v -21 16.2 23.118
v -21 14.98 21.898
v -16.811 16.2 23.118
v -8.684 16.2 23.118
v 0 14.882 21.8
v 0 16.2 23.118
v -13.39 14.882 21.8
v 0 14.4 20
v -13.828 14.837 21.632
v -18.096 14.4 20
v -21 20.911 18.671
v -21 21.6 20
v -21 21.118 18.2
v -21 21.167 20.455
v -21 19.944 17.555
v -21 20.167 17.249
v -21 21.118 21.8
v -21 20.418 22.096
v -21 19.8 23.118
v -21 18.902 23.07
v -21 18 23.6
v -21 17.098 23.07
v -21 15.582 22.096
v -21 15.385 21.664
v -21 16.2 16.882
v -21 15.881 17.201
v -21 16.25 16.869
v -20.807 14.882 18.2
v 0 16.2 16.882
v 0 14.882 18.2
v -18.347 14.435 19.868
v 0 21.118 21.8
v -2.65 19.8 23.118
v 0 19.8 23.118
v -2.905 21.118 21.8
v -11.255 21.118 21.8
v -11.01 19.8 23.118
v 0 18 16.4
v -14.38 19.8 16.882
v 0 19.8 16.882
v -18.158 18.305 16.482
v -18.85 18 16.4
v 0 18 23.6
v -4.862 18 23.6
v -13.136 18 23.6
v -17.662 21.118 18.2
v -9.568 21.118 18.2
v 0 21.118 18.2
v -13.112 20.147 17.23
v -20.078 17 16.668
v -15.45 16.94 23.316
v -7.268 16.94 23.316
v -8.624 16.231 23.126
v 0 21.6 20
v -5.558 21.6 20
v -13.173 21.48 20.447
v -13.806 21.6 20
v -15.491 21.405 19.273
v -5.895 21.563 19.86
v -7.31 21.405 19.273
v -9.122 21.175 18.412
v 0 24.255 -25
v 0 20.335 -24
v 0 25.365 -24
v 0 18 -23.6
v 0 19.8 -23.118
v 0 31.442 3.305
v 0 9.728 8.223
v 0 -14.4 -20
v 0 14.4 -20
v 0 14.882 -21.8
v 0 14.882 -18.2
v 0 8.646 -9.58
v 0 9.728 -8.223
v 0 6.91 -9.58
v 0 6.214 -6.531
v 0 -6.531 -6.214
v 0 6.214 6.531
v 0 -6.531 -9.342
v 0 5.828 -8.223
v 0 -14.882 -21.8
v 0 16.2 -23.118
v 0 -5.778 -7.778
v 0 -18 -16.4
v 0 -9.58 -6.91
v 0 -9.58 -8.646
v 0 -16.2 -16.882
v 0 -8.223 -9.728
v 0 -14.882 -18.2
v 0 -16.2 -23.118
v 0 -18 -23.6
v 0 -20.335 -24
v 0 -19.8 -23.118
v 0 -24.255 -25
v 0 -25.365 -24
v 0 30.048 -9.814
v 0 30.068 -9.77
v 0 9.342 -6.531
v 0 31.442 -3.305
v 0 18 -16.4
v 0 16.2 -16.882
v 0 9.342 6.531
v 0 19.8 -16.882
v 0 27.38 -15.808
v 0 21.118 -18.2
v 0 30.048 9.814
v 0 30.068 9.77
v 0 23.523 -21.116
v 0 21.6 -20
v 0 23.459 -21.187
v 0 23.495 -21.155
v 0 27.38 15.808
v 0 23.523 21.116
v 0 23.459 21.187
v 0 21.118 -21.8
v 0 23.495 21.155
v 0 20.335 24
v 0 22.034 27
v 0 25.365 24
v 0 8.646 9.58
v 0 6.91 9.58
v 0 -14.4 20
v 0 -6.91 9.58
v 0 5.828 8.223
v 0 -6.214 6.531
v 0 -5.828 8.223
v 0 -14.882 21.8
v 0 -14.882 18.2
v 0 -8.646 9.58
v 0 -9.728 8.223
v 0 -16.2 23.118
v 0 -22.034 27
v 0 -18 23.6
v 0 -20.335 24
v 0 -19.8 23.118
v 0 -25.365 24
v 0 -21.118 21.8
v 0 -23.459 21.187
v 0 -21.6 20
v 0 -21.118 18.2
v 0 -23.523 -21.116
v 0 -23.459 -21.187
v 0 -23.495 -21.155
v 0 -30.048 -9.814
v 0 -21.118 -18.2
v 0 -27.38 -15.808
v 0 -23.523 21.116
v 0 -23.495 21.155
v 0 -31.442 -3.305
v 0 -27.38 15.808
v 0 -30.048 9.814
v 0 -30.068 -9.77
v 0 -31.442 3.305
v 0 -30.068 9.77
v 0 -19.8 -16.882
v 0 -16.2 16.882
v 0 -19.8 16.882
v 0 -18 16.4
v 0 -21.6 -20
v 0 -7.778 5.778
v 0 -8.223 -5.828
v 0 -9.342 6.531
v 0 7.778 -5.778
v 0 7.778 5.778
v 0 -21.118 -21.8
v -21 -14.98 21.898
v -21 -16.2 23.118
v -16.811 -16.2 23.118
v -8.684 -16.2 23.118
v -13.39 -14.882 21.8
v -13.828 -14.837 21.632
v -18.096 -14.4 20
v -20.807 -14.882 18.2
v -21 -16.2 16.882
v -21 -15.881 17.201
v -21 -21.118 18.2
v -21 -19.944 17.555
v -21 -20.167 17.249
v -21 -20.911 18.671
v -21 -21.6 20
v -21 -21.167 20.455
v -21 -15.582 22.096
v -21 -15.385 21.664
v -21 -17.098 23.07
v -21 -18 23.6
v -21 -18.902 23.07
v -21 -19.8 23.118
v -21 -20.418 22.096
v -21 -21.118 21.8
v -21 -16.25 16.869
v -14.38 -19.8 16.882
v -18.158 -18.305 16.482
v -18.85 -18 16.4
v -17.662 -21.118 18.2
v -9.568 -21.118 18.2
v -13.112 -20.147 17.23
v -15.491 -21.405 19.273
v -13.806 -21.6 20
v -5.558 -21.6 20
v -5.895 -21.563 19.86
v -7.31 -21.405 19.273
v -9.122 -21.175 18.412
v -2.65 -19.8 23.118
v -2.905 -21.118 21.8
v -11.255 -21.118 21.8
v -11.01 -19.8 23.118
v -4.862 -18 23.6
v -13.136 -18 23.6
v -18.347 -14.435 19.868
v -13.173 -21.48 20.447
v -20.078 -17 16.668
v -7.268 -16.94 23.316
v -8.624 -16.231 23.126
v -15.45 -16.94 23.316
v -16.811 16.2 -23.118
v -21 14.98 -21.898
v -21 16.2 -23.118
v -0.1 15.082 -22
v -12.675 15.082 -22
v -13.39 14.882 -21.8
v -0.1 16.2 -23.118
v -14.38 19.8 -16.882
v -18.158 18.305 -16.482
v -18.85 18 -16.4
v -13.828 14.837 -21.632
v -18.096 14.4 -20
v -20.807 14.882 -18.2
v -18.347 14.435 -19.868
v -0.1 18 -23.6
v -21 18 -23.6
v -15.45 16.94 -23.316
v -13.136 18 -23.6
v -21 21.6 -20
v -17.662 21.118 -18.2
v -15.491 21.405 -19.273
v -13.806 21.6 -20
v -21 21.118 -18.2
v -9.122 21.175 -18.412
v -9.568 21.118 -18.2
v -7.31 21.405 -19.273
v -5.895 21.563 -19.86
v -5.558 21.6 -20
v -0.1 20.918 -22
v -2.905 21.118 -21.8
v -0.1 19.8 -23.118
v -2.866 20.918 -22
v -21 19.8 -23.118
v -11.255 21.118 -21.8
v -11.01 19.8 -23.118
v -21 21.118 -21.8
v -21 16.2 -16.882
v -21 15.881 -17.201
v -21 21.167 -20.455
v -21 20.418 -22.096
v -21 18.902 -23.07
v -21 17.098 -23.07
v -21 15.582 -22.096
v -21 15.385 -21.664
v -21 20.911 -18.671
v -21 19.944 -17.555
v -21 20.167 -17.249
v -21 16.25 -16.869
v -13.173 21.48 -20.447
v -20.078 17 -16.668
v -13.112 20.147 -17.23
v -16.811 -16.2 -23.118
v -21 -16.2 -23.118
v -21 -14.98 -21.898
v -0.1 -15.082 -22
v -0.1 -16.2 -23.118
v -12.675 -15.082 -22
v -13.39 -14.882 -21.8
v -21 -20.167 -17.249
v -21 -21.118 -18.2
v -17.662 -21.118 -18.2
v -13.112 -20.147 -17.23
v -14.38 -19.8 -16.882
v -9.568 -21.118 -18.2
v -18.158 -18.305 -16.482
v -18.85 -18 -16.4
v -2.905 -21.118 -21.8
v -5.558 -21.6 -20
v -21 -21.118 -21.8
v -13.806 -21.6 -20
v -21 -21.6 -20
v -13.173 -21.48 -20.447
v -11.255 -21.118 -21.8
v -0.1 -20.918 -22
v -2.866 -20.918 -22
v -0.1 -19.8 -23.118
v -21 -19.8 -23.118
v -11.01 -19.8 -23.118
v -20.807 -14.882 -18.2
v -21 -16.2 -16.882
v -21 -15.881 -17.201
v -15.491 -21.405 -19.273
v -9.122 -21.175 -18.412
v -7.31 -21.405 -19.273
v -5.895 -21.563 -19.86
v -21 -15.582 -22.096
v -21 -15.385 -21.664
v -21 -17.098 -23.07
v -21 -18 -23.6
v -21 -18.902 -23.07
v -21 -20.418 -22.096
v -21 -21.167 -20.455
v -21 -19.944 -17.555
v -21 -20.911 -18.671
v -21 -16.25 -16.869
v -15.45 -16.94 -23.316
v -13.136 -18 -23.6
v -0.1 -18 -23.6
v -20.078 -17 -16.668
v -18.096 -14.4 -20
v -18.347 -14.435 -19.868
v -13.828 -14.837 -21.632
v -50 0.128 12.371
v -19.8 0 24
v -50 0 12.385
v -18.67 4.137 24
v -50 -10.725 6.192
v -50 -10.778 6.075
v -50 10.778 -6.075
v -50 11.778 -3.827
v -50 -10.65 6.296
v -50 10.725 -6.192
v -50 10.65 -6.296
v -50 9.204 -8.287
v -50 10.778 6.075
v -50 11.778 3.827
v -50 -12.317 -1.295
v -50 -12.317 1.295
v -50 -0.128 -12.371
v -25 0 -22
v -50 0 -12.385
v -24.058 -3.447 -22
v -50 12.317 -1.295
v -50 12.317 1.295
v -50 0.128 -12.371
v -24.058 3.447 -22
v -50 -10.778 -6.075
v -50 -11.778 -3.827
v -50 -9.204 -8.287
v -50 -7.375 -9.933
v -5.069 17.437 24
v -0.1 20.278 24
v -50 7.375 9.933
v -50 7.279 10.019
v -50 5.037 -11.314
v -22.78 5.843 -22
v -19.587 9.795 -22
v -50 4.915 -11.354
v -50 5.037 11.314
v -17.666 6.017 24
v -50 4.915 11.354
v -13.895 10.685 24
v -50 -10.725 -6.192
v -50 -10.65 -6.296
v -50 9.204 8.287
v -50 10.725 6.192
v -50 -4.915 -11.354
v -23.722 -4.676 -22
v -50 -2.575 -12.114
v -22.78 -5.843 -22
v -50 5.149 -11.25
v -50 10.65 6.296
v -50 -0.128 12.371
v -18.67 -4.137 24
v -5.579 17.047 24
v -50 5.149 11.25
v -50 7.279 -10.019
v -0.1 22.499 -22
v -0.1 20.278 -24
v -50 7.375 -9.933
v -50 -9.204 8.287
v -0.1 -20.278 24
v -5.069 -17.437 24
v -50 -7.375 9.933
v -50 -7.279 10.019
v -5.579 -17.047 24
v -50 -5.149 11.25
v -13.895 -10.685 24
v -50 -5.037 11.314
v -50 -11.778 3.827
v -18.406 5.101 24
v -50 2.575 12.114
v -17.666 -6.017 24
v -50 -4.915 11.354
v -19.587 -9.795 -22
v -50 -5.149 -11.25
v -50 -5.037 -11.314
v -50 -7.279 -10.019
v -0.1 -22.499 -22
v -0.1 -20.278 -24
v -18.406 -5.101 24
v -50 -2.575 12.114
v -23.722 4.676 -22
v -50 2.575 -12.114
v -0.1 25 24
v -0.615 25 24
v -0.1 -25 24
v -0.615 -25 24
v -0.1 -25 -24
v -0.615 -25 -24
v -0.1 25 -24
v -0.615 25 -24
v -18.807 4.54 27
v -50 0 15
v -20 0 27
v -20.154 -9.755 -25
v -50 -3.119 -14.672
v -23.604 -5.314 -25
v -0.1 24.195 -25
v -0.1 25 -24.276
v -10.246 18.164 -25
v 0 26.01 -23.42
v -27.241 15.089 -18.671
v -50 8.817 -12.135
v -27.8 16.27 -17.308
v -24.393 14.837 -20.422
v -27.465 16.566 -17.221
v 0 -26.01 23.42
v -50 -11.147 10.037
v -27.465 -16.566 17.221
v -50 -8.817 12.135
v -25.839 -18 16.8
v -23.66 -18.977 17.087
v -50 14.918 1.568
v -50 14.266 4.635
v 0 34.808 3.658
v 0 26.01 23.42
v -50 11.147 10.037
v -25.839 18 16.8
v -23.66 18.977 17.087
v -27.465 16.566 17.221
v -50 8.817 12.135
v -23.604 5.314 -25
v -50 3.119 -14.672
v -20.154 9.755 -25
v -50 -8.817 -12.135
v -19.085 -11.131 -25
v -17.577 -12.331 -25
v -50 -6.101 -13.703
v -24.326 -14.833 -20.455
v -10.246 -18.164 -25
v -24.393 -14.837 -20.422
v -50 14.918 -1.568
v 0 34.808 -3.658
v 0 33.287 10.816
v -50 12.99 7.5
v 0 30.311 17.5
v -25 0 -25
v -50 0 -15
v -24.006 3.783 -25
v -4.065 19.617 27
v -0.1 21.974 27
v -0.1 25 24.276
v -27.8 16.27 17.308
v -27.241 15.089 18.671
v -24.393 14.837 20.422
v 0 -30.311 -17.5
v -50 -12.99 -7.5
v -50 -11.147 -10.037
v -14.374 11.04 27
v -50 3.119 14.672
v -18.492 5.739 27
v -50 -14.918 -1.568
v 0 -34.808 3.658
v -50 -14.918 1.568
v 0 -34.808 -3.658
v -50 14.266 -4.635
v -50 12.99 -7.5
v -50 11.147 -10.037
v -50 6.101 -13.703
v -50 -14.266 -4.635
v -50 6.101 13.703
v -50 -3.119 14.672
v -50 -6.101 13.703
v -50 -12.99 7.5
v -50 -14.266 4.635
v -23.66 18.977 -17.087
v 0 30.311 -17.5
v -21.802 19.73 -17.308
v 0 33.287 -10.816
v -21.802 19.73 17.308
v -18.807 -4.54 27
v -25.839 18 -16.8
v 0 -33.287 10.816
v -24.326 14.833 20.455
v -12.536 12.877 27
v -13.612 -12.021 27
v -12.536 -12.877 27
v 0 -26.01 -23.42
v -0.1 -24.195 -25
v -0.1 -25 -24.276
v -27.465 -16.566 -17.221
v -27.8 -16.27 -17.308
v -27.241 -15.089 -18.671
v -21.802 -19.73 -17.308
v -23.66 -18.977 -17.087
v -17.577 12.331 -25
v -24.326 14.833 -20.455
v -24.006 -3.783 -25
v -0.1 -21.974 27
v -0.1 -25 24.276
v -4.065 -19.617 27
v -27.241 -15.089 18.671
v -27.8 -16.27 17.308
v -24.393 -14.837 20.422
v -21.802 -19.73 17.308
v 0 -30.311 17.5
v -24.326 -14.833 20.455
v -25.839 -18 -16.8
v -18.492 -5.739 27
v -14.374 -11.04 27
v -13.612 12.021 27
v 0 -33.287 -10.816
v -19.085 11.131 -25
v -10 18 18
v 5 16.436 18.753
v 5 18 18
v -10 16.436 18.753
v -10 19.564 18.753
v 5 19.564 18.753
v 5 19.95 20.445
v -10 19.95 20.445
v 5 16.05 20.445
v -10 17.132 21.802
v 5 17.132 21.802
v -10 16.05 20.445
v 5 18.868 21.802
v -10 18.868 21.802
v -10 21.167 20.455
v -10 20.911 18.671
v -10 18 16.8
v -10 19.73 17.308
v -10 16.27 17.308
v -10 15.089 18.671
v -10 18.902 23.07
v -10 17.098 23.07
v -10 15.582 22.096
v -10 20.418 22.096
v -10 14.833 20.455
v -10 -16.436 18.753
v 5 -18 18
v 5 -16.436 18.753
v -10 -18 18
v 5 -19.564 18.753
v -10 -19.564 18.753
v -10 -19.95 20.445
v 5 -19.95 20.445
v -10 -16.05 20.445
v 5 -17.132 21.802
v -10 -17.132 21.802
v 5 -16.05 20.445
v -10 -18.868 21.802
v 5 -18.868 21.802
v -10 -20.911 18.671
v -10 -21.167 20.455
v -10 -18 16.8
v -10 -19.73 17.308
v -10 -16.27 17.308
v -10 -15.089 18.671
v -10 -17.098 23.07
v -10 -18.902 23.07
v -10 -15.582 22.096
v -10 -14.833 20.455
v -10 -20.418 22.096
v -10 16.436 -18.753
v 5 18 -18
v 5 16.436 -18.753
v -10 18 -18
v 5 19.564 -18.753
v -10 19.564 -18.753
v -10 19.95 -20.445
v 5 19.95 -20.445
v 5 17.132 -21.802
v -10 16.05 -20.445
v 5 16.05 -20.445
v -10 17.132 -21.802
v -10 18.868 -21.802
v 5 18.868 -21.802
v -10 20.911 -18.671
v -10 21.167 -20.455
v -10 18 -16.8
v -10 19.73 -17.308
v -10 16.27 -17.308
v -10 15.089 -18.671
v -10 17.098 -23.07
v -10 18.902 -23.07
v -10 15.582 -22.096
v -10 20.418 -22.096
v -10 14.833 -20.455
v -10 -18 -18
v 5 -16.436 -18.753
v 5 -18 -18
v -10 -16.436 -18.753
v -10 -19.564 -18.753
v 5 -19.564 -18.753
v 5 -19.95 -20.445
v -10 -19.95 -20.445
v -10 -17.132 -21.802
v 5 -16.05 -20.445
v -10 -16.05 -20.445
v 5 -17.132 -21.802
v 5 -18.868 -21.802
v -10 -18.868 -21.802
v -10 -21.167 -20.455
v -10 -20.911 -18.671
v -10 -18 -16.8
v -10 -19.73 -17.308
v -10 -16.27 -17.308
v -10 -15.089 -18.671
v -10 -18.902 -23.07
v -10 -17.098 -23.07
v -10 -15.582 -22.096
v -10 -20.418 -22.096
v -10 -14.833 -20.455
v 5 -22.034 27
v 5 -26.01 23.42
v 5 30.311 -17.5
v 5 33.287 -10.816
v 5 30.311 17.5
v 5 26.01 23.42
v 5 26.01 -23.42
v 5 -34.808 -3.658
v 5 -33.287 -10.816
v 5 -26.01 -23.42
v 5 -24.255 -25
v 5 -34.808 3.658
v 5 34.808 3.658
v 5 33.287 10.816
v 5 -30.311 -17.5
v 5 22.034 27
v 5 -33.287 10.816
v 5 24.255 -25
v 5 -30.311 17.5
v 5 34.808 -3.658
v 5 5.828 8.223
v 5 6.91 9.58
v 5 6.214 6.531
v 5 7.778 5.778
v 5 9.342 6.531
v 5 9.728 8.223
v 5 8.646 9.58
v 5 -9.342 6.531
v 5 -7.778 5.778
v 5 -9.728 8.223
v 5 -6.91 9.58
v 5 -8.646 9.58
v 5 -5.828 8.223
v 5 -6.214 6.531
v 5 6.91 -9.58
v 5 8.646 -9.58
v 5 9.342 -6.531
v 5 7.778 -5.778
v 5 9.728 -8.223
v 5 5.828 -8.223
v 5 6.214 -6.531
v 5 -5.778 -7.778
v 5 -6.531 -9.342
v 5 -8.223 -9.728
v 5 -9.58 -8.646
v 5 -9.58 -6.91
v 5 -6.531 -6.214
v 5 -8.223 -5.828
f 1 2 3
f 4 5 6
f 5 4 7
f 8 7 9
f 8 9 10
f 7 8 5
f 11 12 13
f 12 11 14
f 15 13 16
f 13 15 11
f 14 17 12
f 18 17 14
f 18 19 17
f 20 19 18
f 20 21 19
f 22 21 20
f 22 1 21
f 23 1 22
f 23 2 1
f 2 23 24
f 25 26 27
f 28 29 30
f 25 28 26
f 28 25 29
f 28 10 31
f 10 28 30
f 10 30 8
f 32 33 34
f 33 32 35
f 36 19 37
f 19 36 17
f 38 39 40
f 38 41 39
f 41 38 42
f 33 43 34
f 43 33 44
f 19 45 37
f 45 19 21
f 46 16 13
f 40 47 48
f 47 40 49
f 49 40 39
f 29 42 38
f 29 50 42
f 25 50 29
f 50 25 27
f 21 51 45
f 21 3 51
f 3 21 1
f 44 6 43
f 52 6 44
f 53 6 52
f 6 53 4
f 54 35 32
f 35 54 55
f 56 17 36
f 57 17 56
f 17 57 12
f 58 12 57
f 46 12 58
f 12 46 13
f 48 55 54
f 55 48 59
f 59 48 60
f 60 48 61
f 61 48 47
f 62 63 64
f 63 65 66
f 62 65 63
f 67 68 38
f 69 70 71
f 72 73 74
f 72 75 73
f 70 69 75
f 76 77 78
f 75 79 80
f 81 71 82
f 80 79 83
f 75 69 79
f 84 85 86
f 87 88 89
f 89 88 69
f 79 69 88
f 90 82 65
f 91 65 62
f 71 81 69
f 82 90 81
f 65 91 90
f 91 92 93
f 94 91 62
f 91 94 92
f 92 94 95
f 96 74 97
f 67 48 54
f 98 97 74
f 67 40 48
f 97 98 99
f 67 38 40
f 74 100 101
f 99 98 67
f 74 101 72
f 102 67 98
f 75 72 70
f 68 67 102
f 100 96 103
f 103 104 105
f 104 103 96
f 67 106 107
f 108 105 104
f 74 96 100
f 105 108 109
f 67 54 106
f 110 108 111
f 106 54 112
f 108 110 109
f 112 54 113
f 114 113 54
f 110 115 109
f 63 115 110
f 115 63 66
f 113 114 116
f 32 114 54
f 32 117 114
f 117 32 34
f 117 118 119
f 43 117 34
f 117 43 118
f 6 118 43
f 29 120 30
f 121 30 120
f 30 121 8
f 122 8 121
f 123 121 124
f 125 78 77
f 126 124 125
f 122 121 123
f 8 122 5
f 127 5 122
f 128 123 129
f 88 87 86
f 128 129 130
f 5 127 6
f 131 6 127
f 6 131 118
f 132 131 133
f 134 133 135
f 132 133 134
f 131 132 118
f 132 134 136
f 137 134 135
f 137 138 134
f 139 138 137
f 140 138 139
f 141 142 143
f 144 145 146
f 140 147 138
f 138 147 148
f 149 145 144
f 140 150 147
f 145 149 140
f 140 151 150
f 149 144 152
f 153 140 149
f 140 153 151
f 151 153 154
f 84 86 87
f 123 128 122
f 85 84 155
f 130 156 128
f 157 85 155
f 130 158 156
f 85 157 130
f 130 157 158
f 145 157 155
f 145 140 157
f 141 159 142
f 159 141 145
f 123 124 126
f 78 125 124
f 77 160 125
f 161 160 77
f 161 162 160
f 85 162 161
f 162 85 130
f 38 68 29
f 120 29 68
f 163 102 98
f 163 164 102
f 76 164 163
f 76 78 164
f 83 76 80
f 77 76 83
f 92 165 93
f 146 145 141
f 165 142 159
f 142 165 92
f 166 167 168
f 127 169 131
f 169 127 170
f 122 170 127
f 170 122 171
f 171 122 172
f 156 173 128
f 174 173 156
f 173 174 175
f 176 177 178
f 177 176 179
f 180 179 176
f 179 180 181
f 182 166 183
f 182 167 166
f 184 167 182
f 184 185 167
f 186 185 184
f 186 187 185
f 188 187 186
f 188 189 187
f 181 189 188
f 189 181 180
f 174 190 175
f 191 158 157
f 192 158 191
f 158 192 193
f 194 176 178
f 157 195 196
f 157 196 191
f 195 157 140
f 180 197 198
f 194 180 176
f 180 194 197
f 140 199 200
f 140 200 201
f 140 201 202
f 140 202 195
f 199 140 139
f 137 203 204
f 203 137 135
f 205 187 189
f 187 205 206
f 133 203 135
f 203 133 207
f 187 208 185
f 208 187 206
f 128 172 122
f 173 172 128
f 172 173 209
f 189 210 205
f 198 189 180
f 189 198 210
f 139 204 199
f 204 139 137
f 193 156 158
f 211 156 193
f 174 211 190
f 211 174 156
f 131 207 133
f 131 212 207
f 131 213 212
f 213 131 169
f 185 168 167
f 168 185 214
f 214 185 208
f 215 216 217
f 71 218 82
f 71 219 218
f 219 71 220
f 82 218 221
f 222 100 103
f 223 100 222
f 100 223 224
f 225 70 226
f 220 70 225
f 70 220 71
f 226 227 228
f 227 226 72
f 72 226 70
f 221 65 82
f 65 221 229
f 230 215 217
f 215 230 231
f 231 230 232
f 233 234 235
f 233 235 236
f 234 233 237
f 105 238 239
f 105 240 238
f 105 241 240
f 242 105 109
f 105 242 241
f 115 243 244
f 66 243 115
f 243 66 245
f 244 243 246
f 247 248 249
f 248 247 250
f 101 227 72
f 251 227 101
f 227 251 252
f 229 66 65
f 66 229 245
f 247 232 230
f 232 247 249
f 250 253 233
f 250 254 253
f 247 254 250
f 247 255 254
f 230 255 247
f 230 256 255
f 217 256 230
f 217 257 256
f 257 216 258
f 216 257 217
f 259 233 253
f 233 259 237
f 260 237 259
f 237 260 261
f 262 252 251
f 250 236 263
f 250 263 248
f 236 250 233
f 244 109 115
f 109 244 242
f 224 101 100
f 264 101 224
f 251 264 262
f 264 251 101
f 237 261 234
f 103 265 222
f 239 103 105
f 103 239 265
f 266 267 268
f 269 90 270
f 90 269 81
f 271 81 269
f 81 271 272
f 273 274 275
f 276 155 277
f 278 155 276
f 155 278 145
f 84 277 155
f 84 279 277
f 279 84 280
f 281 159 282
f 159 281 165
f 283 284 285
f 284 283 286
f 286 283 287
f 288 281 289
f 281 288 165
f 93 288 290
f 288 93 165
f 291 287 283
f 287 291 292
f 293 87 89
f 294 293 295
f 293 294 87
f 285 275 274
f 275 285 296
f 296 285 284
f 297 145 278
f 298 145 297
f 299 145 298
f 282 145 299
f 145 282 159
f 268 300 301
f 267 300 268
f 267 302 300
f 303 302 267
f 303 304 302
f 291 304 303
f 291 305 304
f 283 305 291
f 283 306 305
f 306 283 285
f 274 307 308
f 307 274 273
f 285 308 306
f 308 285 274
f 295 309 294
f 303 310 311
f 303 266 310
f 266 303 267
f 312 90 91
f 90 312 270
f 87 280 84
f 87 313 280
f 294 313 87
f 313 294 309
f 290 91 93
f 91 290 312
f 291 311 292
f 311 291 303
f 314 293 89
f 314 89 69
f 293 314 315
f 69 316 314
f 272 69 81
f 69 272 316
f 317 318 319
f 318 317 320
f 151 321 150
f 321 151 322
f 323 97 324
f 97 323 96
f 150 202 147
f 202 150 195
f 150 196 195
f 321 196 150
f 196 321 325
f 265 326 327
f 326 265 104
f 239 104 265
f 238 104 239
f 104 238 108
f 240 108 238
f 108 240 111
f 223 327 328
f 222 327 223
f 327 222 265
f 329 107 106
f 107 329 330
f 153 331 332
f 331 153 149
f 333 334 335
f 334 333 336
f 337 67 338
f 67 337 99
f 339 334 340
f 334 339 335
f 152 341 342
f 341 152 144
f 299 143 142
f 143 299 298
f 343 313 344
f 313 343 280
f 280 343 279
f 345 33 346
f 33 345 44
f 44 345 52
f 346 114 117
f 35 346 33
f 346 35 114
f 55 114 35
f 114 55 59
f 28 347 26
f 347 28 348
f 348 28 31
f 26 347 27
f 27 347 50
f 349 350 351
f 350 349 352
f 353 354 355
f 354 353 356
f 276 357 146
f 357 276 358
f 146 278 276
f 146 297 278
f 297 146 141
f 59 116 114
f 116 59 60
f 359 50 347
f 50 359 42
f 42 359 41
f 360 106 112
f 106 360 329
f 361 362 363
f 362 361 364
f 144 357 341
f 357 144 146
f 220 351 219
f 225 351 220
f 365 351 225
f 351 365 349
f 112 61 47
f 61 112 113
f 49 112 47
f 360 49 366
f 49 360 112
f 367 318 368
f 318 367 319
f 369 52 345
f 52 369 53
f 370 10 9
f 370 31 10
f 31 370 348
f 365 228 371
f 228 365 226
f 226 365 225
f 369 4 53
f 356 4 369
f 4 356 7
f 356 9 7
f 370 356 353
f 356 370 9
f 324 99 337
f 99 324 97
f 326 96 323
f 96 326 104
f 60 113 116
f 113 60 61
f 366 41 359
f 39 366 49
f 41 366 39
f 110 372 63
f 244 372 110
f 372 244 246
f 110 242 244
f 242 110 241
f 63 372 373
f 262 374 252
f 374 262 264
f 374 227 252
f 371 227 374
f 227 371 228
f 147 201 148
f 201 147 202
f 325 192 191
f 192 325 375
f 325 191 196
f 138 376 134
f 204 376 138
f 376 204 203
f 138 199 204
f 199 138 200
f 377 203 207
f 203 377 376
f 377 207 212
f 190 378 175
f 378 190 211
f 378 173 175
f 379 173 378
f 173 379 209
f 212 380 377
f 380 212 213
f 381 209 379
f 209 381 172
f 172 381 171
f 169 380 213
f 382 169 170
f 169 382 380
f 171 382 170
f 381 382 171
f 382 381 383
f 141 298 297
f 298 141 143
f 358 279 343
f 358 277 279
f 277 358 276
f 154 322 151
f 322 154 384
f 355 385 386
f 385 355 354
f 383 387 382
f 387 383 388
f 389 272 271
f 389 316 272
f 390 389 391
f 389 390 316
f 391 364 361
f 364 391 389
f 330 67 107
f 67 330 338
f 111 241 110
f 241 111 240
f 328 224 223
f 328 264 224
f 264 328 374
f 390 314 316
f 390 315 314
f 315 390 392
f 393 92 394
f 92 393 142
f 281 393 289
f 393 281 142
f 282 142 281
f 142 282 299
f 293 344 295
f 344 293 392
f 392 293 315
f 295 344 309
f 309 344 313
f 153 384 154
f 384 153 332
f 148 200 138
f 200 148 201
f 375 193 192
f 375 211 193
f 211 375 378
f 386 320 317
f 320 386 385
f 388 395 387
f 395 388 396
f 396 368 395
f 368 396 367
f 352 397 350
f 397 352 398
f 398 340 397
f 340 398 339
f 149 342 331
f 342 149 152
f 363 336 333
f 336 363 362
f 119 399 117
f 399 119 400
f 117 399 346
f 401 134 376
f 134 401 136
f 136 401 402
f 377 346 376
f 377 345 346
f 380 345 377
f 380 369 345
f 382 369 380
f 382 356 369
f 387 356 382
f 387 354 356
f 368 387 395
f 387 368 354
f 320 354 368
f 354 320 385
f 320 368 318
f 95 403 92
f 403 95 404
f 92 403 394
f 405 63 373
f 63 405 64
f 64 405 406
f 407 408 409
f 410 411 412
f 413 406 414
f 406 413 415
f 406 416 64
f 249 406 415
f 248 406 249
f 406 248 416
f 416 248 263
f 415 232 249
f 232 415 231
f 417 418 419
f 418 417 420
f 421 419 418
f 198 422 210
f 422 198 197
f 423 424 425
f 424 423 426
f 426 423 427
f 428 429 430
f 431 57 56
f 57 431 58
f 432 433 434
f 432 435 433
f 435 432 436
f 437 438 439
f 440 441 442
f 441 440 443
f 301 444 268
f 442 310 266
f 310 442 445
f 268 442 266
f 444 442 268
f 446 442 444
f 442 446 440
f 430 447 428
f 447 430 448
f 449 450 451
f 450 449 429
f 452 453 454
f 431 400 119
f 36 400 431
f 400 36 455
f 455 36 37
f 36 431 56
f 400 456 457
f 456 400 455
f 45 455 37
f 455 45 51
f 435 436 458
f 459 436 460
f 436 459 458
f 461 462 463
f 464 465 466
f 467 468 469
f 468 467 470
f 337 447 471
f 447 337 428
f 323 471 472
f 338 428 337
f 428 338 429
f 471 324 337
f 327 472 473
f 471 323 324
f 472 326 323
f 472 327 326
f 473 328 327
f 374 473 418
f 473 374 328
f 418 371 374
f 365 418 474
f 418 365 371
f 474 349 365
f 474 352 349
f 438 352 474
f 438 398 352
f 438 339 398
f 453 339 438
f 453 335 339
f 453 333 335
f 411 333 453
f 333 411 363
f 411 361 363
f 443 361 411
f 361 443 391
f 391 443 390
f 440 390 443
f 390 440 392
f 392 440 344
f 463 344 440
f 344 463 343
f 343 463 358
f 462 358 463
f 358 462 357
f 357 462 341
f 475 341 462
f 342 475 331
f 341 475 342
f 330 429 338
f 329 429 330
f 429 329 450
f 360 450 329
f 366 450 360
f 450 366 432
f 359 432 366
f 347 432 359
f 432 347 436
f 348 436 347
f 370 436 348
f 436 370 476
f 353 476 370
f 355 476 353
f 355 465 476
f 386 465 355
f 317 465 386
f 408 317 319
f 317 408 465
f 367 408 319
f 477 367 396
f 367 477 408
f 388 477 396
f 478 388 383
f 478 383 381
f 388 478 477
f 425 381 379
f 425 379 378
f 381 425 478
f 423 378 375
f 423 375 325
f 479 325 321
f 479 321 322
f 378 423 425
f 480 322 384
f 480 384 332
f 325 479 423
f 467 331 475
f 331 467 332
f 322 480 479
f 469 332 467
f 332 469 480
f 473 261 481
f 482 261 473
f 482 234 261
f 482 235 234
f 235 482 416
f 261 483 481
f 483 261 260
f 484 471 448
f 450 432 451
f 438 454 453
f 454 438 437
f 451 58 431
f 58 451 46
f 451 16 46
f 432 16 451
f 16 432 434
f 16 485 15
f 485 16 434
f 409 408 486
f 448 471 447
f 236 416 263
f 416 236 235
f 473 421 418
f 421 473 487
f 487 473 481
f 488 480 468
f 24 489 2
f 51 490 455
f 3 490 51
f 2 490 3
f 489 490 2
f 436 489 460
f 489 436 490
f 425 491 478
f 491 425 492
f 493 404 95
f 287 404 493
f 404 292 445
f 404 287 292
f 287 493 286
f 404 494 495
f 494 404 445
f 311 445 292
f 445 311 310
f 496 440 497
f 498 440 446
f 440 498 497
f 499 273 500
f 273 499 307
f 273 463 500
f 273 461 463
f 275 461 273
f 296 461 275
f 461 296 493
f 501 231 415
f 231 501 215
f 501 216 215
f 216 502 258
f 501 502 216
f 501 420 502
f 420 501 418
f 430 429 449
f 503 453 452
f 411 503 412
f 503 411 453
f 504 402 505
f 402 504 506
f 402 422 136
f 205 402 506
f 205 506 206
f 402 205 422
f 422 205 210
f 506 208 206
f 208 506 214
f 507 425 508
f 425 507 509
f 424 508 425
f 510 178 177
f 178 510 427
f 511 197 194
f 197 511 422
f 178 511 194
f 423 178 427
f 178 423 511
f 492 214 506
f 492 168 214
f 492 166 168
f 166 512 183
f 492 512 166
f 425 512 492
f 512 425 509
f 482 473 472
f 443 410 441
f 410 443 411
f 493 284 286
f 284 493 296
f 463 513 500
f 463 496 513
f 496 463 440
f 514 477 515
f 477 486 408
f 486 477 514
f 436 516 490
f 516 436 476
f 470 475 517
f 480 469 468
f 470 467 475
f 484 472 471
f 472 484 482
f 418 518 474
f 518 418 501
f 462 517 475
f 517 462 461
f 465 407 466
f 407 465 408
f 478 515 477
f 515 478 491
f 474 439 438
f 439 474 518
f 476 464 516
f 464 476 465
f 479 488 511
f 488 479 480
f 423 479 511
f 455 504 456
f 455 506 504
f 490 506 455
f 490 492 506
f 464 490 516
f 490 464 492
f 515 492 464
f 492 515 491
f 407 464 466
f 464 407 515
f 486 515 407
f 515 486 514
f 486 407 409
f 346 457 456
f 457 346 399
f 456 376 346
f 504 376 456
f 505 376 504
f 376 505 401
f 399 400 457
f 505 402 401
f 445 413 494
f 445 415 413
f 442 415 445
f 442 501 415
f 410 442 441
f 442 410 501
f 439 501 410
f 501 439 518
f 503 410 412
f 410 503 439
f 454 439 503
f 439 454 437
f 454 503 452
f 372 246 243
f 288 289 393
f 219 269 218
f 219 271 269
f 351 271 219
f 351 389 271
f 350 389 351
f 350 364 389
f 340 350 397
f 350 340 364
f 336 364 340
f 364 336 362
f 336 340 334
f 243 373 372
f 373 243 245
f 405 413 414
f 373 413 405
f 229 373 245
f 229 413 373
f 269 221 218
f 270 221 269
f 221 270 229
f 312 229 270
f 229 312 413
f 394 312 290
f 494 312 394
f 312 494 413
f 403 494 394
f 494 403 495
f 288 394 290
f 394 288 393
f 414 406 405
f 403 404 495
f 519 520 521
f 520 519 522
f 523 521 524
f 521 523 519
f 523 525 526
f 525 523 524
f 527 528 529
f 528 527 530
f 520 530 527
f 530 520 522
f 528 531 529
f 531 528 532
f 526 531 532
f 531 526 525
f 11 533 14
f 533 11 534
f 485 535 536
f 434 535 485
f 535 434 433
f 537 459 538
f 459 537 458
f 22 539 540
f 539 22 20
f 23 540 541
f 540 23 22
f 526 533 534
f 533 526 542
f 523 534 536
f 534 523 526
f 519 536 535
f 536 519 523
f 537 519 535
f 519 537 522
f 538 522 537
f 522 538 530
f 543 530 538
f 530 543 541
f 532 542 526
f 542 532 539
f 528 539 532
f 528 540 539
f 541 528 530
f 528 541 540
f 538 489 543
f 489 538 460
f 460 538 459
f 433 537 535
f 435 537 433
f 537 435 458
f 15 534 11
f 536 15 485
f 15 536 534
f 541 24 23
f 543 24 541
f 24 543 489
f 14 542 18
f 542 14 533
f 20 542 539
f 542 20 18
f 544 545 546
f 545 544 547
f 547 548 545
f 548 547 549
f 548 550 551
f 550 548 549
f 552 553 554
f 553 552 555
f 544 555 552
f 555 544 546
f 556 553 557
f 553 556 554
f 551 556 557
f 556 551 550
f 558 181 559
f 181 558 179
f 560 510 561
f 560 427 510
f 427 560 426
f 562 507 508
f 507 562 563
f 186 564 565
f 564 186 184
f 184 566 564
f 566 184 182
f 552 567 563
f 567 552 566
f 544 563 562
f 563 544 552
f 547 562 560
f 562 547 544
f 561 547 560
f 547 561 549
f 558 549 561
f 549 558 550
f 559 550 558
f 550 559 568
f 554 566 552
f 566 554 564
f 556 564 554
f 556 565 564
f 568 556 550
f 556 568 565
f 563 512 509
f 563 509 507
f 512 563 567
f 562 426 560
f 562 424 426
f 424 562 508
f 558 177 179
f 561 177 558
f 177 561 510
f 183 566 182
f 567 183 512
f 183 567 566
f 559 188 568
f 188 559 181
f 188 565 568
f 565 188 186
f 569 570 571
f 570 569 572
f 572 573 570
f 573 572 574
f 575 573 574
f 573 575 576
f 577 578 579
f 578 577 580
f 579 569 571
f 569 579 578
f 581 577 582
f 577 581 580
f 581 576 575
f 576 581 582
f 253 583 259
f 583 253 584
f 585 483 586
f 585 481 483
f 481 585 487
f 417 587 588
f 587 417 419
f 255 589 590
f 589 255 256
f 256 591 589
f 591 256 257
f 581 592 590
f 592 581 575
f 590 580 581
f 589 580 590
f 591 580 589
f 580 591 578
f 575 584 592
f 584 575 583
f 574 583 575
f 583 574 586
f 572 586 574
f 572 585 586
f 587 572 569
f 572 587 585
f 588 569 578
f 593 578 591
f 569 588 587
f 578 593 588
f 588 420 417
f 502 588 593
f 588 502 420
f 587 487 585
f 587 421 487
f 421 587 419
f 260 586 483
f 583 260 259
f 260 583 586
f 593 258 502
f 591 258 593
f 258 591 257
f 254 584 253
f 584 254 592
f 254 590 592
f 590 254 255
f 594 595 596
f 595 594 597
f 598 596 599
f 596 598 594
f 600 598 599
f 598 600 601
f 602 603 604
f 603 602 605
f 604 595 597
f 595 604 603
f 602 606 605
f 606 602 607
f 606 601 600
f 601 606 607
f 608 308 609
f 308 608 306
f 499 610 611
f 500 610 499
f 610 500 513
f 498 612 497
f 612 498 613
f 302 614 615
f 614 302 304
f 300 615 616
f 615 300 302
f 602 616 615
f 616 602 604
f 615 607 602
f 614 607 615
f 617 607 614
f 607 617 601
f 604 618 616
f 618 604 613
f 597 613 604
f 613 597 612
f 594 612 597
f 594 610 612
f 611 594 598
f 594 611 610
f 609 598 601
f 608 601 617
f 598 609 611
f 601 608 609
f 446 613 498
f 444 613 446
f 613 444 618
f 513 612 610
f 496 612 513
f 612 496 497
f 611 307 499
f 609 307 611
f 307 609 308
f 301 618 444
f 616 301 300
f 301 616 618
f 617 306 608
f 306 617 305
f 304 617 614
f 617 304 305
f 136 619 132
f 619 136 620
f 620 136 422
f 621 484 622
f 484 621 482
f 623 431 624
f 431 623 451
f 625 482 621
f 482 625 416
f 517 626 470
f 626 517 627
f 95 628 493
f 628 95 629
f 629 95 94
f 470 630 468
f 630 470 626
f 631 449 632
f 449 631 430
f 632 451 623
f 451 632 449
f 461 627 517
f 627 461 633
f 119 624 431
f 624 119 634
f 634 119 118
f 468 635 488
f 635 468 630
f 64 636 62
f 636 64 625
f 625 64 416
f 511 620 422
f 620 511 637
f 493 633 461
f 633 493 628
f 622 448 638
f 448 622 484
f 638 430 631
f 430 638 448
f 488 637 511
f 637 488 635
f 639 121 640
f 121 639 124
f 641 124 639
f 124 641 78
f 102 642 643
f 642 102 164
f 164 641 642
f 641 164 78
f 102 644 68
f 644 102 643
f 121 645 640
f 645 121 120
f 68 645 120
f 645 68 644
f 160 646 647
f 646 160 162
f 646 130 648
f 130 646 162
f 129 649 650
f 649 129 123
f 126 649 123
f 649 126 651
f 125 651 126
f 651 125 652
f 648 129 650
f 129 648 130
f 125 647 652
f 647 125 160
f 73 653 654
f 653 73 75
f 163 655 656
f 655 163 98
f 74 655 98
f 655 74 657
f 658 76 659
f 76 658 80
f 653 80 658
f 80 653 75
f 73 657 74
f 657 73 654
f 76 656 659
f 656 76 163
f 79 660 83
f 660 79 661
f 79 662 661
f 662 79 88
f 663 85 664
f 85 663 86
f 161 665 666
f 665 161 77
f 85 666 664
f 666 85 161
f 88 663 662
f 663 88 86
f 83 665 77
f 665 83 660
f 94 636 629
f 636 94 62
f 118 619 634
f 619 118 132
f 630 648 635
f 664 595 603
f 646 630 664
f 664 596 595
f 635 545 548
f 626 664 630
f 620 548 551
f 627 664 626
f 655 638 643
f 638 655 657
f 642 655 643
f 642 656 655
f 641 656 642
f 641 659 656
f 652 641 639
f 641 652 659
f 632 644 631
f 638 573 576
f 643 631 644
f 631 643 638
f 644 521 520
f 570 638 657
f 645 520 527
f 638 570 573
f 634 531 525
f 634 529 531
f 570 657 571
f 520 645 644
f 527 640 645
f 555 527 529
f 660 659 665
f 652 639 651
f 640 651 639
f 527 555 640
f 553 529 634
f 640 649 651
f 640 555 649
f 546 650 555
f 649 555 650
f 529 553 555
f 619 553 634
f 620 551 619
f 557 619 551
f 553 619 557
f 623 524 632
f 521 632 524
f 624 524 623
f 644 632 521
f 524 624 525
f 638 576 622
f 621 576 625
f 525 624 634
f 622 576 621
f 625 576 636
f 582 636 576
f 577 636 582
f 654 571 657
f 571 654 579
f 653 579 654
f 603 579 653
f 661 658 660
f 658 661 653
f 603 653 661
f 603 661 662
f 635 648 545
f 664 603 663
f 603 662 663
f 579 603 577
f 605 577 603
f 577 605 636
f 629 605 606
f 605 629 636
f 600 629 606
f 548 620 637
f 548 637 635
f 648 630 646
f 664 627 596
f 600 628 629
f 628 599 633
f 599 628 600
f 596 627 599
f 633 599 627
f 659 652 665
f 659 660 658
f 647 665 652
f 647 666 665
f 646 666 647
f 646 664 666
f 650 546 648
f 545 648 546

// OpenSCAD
module nose_one_hole(){
  translate([-25,18,20])
  rotate([0,90,0])
  cylinder(r=2,h=60);
  nose_one_countersunk();
}

module nose_one_countersunk(){
  translate([-30,18,20])
  rotate([0,90,0])
  cylinder(r=3.2,h=20);
}

module nose_one_screw_cylinder(){
  translate([-21,18,20]) rotate([0,90,0]) cylinder(r=3.6,h=21);
}

module nose_screw_cylinders(){
  mirror([0,0,0]) nose_one_screw_cylinder();
  mirror([0,1,0]) nose_one_screw_cylinder();
  mirror([0,0,1]) nose_one_screw_cylinder();
  mirror([0,1,0])mirror([0,0,1]) nose_one_screw_cylinder();
}

module nose_holes(){
  mirror([0,0,0]) nose_one_hole();
  mirror([0,1,0]) nose_one_hole();
  mirror([0,0,1]) nose_one_hole();
  mirror([0,1,0])mirror([0,0,1]) nose_one_hole();
}

module nose(){

difference(){
  nose_no_holes();
  nose_holes();
}

}

module nose_no_holes(){
      nose_screw_cylinders();
translate([155,0,0])
rotate([0,180,0])
  difference(){
    union(){
      difference(){
          translate([155,0,0])
          rotate([0,90,0])
          cylinder(r1=35,r2=15,h=50);

        union(){

          // Inner
          translate([154,0,0])
          rotate([0,90,0])
          cylinder(r1=32,r2=12,h=52);

          // Upper plane
          translate([1,-100,-63+1])
          cube([2000,2000,38]);

          // Down plane
          translate([1,-100,27-3])
          cube([2000,2000,40]);
        }
      }
      // Upper plane
      translate([155+0.1,-25,-27])
      cube([30,50,3]);

      // Down plane
      translate([155+0.1,-25,26-4])
      cube([30,50,3]);

    }

    // Clear perimeter of nose
    difference(){
      translate([155,0,0])
      rotate([0,90,0])
      cylinder(r1=370,r2=170,h=60);

      translate([155,0,0])
      rotate([0,90,0])
      cylinder(r1=35,r2=15,h=50);

    }
  }
}
module 
motor_hole(){
  translate([-70,15.556/2,15.556/2])
  rotate([0,90,0])
  cylinder(r1=2,r2=2,h=100);
}
module motor_holes(){
  mirror([0,0,0])motor_hole();
  mirror([0,1,0])motor_hole();
  mirror([0,0,1])motor_hole();
  mirror([0,1,1])motor_hole();

}

module motor_plate(){
    difference(){

  translate([0,-35,-30])cube([5,70,70]);
  union(){
  difference(){
    translate([-1,0,0]) rotate([0,90,0]) cylinder(r=100,h=50);
    translate([0,0,0]) rotate([0,90,0]) cylinder(r=35,h=50);
  }
      // Upper plane
      translate([-1,-25,-35])
      cube([30,50,10]);

      // Down plane
      translate([-1,-25,27])
      cube([30,50,30]);

nose_holes();
motor_holes();

  }

    }



}

nose();

motor_plate();
